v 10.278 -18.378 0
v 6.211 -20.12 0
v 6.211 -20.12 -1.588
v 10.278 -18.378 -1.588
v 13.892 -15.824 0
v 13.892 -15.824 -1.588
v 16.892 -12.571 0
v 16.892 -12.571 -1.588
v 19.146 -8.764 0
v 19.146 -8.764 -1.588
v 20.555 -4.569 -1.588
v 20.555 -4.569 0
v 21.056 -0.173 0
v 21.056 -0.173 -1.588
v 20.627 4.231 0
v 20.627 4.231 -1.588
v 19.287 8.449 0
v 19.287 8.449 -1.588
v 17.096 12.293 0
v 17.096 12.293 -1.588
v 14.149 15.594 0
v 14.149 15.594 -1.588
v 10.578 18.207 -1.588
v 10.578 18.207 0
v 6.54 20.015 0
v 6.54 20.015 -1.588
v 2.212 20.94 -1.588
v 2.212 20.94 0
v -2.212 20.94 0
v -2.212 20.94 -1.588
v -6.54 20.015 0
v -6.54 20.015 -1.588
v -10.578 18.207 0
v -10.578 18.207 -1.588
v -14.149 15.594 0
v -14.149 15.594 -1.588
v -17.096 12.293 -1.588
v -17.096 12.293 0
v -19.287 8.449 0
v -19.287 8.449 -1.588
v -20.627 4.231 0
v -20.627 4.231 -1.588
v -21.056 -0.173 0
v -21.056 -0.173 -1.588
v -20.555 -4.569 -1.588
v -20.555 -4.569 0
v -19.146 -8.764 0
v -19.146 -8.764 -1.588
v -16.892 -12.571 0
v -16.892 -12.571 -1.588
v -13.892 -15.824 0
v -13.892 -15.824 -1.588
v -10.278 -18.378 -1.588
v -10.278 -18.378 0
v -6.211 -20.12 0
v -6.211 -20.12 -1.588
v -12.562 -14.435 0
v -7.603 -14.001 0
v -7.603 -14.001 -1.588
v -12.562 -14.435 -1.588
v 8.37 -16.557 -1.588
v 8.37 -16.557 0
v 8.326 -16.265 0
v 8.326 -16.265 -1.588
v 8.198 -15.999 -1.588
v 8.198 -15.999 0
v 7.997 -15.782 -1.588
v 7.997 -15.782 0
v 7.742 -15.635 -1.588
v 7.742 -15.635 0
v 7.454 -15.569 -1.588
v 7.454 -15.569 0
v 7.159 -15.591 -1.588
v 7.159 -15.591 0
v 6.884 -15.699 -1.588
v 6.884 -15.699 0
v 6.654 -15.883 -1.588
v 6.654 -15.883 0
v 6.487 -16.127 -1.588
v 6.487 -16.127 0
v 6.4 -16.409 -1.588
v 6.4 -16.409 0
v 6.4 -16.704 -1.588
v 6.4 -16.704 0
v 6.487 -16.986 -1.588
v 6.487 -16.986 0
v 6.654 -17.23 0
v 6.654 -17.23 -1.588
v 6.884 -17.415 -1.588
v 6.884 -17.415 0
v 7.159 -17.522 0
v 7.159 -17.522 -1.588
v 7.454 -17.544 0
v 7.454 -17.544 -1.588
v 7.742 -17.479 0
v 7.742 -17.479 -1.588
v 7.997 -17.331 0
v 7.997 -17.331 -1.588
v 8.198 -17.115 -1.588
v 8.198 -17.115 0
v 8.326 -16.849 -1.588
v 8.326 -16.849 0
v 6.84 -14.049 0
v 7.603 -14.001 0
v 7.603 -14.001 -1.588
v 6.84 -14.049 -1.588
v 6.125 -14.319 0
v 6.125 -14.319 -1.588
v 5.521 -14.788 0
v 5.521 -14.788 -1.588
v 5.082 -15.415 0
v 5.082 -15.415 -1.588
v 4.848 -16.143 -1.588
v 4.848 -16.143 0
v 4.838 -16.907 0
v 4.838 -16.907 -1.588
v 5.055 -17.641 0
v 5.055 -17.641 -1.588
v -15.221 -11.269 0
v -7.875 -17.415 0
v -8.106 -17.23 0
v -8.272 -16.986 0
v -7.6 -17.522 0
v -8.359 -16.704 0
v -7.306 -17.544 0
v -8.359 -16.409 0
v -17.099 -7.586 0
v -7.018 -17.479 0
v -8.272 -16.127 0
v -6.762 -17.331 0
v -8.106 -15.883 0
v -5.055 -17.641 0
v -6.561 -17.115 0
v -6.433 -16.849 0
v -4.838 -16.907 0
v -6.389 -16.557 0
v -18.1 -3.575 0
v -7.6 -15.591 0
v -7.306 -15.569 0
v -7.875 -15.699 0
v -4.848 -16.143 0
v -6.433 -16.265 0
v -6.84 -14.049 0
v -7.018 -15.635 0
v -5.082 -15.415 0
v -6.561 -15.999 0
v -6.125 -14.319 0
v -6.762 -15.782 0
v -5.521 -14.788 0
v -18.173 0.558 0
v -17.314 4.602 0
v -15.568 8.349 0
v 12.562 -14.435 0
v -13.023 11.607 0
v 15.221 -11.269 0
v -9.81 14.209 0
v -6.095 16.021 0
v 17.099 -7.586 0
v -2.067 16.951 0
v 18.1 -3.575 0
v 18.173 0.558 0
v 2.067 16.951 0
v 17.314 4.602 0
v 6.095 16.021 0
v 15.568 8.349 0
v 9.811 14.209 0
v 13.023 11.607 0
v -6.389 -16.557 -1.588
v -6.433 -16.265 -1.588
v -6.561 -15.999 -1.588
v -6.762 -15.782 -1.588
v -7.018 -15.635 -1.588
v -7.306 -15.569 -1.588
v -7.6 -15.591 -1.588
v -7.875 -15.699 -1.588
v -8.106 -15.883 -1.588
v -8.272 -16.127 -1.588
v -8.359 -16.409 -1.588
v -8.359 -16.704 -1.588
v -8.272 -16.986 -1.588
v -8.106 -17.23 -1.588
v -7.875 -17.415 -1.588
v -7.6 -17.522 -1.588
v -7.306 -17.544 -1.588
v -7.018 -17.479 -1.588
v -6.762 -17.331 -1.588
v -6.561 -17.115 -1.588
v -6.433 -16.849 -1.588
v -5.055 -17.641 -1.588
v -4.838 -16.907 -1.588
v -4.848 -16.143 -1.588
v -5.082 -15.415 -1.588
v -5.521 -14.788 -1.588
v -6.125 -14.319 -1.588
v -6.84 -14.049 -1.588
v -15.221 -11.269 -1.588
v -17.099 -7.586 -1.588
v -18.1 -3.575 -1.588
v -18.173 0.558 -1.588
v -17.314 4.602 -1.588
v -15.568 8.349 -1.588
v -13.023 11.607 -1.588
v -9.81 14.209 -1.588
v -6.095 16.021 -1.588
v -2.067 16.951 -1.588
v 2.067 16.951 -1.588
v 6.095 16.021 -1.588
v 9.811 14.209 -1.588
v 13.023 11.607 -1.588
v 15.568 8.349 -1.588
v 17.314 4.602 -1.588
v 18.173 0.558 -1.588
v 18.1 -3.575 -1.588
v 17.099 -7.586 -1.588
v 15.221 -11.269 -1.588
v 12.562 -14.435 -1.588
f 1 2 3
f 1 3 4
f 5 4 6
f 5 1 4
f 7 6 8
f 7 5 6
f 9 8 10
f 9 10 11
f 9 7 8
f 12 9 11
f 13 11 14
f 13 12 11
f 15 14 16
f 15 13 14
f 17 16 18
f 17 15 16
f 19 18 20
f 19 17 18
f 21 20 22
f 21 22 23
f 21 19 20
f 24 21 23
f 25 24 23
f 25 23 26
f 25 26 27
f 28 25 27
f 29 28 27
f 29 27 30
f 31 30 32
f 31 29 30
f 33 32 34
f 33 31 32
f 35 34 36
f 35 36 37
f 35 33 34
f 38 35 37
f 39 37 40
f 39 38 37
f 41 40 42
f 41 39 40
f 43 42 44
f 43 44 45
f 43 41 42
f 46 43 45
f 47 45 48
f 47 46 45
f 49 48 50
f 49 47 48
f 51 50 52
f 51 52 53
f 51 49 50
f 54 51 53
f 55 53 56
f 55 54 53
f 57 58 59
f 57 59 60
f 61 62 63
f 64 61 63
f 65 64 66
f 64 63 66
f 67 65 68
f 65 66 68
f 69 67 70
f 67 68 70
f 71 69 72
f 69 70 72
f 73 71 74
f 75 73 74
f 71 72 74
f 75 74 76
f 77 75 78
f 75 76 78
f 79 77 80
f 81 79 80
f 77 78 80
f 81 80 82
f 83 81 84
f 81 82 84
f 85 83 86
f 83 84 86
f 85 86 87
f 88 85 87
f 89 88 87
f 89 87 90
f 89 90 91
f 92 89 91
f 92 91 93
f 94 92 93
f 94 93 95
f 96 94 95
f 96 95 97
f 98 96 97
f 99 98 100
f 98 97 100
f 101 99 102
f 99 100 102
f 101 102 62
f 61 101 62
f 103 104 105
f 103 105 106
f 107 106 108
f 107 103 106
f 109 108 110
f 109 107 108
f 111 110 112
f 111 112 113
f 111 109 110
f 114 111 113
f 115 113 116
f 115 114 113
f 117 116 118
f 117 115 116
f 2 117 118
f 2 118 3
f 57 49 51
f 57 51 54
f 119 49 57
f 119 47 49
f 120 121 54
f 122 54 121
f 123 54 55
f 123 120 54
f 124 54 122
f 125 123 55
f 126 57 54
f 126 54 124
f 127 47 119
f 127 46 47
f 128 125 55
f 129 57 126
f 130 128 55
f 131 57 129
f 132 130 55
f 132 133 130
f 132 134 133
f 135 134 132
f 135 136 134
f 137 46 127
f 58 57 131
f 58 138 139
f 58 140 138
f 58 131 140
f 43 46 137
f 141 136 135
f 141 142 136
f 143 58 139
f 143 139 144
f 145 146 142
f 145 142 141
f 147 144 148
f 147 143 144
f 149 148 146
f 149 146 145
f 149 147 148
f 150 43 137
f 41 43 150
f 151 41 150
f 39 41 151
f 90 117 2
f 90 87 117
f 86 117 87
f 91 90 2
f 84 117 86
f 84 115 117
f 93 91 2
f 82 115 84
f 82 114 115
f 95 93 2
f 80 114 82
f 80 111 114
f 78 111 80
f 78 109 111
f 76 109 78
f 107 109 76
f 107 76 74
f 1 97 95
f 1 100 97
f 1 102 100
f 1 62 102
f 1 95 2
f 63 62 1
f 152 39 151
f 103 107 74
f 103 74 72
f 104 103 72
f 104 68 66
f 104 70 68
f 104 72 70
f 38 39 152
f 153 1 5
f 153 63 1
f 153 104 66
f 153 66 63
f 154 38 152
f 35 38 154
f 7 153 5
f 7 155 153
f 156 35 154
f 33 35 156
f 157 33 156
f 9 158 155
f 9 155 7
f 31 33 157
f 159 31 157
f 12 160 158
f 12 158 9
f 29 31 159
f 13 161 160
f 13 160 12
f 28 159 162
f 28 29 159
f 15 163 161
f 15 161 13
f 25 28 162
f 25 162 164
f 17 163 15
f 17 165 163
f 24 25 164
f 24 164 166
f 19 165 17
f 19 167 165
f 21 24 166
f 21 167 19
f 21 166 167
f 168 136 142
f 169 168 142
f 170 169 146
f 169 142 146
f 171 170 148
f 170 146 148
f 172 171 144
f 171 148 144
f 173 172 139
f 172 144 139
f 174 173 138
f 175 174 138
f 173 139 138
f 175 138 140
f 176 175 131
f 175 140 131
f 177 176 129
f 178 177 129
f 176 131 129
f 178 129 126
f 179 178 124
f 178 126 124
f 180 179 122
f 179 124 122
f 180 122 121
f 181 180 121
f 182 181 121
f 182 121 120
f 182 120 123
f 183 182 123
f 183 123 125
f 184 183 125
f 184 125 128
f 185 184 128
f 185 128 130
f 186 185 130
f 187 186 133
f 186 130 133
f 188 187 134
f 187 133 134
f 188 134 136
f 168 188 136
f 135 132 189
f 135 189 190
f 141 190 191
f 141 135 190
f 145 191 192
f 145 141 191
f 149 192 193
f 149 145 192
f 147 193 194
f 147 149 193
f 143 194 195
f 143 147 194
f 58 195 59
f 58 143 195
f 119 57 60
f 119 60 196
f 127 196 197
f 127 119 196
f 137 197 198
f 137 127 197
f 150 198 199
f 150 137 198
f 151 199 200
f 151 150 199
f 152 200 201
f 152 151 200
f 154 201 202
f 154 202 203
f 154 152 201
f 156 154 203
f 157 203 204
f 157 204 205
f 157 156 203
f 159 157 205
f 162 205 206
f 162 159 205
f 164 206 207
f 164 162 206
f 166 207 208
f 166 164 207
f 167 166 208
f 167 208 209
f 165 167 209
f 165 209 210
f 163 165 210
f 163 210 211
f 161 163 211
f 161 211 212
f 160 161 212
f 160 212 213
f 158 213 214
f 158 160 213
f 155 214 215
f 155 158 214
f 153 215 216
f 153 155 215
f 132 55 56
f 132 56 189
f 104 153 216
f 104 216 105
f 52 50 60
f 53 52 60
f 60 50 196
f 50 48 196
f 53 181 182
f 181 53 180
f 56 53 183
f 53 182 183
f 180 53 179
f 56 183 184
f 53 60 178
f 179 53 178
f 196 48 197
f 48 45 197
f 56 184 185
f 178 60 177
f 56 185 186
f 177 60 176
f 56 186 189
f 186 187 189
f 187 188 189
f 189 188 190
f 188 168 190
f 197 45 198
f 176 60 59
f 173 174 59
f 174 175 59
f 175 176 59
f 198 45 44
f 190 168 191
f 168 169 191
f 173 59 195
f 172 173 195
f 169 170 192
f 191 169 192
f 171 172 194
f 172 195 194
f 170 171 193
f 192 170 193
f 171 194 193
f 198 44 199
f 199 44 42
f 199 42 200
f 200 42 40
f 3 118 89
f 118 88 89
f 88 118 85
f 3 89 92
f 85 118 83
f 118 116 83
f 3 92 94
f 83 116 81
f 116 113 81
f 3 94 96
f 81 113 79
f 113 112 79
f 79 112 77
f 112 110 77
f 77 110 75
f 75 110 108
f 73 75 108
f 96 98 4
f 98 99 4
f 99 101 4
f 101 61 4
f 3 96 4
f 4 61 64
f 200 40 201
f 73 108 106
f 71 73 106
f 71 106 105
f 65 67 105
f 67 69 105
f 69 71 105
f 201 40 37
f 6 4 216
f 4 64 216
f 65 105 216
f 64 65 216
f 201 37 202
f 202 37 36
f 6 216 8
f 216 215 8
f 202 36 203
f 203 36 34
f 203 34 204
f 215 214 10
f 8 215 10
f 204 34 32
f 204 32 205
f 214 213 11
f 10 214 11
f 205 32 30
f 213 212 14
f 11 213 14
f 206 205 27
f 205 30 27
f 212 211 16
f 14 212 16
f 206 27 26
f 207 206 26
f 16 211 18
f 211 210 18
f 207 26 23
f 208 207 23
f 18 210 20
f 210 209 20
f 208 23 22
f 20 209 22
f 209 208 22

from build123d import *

# Parameters (mm, degrees)
F0_R     = 0.9906
F1_DEPTH = 1.5875


# Not quite as in the source:
# - ends of sketch curves that miss each other by under 0.0002 mm in the source are joined


with BuildPart() as f1:
    # F0 (on Top) → F1 (new body)
    with BuildSketch(Plane.XY):
        with BuildLine():
            Line((41.6924998, -18.8505592), (42.8484792, -21.3295484))
            ThreePointArc((42.8484792, -21.3295484), (36.6378236, 19.8468996), (30.4271688612, -21.32954561))
            Line((30.4271688612, -21.32954561), (31.5831474, -18.8505592))
            ThreePointArc((31.5831474, -18.8505592), (31.3595624423, -16.2949103348), (29.034512192, -15.2107228522))
            Line((29.034512192, -15.2107228522), (24.075517, -15.6445712))
            ThreePointArc((24.075517, -15.6445712), (36.6378236, 15.8590996), (49.2001483474, -15.6445903367))
            Line((49.2001483474, -15.6445903367), (44.2411358, -15.2107138))
            ThreePointArc((44.2411358, -15.2107138), (41.9160847577, -16.2949103348), (41.6924998, -18.8505592))
        make_face()
        with Locations((29.2581076, -17.7663602)):
            Circle(F0_R, mode=Mode.SUBTRACT)
        with Locations((44.0175396, -17.7663602)):
            Circle(F0_R, mode=Mode.SUBTRACT)
    extrude(amount=-F1_DEPTH)


with BuildPart() as f1_1:
    # F3: moved
    add(f1.part.moved(Location((-36.6378236, -19.8468996, 0))))


with BuildPart() as f1_2:
    # F4: moved
    add(f1_1.part.moved(Location((0, 21.0566, 0))))


solid = f1_2.part
